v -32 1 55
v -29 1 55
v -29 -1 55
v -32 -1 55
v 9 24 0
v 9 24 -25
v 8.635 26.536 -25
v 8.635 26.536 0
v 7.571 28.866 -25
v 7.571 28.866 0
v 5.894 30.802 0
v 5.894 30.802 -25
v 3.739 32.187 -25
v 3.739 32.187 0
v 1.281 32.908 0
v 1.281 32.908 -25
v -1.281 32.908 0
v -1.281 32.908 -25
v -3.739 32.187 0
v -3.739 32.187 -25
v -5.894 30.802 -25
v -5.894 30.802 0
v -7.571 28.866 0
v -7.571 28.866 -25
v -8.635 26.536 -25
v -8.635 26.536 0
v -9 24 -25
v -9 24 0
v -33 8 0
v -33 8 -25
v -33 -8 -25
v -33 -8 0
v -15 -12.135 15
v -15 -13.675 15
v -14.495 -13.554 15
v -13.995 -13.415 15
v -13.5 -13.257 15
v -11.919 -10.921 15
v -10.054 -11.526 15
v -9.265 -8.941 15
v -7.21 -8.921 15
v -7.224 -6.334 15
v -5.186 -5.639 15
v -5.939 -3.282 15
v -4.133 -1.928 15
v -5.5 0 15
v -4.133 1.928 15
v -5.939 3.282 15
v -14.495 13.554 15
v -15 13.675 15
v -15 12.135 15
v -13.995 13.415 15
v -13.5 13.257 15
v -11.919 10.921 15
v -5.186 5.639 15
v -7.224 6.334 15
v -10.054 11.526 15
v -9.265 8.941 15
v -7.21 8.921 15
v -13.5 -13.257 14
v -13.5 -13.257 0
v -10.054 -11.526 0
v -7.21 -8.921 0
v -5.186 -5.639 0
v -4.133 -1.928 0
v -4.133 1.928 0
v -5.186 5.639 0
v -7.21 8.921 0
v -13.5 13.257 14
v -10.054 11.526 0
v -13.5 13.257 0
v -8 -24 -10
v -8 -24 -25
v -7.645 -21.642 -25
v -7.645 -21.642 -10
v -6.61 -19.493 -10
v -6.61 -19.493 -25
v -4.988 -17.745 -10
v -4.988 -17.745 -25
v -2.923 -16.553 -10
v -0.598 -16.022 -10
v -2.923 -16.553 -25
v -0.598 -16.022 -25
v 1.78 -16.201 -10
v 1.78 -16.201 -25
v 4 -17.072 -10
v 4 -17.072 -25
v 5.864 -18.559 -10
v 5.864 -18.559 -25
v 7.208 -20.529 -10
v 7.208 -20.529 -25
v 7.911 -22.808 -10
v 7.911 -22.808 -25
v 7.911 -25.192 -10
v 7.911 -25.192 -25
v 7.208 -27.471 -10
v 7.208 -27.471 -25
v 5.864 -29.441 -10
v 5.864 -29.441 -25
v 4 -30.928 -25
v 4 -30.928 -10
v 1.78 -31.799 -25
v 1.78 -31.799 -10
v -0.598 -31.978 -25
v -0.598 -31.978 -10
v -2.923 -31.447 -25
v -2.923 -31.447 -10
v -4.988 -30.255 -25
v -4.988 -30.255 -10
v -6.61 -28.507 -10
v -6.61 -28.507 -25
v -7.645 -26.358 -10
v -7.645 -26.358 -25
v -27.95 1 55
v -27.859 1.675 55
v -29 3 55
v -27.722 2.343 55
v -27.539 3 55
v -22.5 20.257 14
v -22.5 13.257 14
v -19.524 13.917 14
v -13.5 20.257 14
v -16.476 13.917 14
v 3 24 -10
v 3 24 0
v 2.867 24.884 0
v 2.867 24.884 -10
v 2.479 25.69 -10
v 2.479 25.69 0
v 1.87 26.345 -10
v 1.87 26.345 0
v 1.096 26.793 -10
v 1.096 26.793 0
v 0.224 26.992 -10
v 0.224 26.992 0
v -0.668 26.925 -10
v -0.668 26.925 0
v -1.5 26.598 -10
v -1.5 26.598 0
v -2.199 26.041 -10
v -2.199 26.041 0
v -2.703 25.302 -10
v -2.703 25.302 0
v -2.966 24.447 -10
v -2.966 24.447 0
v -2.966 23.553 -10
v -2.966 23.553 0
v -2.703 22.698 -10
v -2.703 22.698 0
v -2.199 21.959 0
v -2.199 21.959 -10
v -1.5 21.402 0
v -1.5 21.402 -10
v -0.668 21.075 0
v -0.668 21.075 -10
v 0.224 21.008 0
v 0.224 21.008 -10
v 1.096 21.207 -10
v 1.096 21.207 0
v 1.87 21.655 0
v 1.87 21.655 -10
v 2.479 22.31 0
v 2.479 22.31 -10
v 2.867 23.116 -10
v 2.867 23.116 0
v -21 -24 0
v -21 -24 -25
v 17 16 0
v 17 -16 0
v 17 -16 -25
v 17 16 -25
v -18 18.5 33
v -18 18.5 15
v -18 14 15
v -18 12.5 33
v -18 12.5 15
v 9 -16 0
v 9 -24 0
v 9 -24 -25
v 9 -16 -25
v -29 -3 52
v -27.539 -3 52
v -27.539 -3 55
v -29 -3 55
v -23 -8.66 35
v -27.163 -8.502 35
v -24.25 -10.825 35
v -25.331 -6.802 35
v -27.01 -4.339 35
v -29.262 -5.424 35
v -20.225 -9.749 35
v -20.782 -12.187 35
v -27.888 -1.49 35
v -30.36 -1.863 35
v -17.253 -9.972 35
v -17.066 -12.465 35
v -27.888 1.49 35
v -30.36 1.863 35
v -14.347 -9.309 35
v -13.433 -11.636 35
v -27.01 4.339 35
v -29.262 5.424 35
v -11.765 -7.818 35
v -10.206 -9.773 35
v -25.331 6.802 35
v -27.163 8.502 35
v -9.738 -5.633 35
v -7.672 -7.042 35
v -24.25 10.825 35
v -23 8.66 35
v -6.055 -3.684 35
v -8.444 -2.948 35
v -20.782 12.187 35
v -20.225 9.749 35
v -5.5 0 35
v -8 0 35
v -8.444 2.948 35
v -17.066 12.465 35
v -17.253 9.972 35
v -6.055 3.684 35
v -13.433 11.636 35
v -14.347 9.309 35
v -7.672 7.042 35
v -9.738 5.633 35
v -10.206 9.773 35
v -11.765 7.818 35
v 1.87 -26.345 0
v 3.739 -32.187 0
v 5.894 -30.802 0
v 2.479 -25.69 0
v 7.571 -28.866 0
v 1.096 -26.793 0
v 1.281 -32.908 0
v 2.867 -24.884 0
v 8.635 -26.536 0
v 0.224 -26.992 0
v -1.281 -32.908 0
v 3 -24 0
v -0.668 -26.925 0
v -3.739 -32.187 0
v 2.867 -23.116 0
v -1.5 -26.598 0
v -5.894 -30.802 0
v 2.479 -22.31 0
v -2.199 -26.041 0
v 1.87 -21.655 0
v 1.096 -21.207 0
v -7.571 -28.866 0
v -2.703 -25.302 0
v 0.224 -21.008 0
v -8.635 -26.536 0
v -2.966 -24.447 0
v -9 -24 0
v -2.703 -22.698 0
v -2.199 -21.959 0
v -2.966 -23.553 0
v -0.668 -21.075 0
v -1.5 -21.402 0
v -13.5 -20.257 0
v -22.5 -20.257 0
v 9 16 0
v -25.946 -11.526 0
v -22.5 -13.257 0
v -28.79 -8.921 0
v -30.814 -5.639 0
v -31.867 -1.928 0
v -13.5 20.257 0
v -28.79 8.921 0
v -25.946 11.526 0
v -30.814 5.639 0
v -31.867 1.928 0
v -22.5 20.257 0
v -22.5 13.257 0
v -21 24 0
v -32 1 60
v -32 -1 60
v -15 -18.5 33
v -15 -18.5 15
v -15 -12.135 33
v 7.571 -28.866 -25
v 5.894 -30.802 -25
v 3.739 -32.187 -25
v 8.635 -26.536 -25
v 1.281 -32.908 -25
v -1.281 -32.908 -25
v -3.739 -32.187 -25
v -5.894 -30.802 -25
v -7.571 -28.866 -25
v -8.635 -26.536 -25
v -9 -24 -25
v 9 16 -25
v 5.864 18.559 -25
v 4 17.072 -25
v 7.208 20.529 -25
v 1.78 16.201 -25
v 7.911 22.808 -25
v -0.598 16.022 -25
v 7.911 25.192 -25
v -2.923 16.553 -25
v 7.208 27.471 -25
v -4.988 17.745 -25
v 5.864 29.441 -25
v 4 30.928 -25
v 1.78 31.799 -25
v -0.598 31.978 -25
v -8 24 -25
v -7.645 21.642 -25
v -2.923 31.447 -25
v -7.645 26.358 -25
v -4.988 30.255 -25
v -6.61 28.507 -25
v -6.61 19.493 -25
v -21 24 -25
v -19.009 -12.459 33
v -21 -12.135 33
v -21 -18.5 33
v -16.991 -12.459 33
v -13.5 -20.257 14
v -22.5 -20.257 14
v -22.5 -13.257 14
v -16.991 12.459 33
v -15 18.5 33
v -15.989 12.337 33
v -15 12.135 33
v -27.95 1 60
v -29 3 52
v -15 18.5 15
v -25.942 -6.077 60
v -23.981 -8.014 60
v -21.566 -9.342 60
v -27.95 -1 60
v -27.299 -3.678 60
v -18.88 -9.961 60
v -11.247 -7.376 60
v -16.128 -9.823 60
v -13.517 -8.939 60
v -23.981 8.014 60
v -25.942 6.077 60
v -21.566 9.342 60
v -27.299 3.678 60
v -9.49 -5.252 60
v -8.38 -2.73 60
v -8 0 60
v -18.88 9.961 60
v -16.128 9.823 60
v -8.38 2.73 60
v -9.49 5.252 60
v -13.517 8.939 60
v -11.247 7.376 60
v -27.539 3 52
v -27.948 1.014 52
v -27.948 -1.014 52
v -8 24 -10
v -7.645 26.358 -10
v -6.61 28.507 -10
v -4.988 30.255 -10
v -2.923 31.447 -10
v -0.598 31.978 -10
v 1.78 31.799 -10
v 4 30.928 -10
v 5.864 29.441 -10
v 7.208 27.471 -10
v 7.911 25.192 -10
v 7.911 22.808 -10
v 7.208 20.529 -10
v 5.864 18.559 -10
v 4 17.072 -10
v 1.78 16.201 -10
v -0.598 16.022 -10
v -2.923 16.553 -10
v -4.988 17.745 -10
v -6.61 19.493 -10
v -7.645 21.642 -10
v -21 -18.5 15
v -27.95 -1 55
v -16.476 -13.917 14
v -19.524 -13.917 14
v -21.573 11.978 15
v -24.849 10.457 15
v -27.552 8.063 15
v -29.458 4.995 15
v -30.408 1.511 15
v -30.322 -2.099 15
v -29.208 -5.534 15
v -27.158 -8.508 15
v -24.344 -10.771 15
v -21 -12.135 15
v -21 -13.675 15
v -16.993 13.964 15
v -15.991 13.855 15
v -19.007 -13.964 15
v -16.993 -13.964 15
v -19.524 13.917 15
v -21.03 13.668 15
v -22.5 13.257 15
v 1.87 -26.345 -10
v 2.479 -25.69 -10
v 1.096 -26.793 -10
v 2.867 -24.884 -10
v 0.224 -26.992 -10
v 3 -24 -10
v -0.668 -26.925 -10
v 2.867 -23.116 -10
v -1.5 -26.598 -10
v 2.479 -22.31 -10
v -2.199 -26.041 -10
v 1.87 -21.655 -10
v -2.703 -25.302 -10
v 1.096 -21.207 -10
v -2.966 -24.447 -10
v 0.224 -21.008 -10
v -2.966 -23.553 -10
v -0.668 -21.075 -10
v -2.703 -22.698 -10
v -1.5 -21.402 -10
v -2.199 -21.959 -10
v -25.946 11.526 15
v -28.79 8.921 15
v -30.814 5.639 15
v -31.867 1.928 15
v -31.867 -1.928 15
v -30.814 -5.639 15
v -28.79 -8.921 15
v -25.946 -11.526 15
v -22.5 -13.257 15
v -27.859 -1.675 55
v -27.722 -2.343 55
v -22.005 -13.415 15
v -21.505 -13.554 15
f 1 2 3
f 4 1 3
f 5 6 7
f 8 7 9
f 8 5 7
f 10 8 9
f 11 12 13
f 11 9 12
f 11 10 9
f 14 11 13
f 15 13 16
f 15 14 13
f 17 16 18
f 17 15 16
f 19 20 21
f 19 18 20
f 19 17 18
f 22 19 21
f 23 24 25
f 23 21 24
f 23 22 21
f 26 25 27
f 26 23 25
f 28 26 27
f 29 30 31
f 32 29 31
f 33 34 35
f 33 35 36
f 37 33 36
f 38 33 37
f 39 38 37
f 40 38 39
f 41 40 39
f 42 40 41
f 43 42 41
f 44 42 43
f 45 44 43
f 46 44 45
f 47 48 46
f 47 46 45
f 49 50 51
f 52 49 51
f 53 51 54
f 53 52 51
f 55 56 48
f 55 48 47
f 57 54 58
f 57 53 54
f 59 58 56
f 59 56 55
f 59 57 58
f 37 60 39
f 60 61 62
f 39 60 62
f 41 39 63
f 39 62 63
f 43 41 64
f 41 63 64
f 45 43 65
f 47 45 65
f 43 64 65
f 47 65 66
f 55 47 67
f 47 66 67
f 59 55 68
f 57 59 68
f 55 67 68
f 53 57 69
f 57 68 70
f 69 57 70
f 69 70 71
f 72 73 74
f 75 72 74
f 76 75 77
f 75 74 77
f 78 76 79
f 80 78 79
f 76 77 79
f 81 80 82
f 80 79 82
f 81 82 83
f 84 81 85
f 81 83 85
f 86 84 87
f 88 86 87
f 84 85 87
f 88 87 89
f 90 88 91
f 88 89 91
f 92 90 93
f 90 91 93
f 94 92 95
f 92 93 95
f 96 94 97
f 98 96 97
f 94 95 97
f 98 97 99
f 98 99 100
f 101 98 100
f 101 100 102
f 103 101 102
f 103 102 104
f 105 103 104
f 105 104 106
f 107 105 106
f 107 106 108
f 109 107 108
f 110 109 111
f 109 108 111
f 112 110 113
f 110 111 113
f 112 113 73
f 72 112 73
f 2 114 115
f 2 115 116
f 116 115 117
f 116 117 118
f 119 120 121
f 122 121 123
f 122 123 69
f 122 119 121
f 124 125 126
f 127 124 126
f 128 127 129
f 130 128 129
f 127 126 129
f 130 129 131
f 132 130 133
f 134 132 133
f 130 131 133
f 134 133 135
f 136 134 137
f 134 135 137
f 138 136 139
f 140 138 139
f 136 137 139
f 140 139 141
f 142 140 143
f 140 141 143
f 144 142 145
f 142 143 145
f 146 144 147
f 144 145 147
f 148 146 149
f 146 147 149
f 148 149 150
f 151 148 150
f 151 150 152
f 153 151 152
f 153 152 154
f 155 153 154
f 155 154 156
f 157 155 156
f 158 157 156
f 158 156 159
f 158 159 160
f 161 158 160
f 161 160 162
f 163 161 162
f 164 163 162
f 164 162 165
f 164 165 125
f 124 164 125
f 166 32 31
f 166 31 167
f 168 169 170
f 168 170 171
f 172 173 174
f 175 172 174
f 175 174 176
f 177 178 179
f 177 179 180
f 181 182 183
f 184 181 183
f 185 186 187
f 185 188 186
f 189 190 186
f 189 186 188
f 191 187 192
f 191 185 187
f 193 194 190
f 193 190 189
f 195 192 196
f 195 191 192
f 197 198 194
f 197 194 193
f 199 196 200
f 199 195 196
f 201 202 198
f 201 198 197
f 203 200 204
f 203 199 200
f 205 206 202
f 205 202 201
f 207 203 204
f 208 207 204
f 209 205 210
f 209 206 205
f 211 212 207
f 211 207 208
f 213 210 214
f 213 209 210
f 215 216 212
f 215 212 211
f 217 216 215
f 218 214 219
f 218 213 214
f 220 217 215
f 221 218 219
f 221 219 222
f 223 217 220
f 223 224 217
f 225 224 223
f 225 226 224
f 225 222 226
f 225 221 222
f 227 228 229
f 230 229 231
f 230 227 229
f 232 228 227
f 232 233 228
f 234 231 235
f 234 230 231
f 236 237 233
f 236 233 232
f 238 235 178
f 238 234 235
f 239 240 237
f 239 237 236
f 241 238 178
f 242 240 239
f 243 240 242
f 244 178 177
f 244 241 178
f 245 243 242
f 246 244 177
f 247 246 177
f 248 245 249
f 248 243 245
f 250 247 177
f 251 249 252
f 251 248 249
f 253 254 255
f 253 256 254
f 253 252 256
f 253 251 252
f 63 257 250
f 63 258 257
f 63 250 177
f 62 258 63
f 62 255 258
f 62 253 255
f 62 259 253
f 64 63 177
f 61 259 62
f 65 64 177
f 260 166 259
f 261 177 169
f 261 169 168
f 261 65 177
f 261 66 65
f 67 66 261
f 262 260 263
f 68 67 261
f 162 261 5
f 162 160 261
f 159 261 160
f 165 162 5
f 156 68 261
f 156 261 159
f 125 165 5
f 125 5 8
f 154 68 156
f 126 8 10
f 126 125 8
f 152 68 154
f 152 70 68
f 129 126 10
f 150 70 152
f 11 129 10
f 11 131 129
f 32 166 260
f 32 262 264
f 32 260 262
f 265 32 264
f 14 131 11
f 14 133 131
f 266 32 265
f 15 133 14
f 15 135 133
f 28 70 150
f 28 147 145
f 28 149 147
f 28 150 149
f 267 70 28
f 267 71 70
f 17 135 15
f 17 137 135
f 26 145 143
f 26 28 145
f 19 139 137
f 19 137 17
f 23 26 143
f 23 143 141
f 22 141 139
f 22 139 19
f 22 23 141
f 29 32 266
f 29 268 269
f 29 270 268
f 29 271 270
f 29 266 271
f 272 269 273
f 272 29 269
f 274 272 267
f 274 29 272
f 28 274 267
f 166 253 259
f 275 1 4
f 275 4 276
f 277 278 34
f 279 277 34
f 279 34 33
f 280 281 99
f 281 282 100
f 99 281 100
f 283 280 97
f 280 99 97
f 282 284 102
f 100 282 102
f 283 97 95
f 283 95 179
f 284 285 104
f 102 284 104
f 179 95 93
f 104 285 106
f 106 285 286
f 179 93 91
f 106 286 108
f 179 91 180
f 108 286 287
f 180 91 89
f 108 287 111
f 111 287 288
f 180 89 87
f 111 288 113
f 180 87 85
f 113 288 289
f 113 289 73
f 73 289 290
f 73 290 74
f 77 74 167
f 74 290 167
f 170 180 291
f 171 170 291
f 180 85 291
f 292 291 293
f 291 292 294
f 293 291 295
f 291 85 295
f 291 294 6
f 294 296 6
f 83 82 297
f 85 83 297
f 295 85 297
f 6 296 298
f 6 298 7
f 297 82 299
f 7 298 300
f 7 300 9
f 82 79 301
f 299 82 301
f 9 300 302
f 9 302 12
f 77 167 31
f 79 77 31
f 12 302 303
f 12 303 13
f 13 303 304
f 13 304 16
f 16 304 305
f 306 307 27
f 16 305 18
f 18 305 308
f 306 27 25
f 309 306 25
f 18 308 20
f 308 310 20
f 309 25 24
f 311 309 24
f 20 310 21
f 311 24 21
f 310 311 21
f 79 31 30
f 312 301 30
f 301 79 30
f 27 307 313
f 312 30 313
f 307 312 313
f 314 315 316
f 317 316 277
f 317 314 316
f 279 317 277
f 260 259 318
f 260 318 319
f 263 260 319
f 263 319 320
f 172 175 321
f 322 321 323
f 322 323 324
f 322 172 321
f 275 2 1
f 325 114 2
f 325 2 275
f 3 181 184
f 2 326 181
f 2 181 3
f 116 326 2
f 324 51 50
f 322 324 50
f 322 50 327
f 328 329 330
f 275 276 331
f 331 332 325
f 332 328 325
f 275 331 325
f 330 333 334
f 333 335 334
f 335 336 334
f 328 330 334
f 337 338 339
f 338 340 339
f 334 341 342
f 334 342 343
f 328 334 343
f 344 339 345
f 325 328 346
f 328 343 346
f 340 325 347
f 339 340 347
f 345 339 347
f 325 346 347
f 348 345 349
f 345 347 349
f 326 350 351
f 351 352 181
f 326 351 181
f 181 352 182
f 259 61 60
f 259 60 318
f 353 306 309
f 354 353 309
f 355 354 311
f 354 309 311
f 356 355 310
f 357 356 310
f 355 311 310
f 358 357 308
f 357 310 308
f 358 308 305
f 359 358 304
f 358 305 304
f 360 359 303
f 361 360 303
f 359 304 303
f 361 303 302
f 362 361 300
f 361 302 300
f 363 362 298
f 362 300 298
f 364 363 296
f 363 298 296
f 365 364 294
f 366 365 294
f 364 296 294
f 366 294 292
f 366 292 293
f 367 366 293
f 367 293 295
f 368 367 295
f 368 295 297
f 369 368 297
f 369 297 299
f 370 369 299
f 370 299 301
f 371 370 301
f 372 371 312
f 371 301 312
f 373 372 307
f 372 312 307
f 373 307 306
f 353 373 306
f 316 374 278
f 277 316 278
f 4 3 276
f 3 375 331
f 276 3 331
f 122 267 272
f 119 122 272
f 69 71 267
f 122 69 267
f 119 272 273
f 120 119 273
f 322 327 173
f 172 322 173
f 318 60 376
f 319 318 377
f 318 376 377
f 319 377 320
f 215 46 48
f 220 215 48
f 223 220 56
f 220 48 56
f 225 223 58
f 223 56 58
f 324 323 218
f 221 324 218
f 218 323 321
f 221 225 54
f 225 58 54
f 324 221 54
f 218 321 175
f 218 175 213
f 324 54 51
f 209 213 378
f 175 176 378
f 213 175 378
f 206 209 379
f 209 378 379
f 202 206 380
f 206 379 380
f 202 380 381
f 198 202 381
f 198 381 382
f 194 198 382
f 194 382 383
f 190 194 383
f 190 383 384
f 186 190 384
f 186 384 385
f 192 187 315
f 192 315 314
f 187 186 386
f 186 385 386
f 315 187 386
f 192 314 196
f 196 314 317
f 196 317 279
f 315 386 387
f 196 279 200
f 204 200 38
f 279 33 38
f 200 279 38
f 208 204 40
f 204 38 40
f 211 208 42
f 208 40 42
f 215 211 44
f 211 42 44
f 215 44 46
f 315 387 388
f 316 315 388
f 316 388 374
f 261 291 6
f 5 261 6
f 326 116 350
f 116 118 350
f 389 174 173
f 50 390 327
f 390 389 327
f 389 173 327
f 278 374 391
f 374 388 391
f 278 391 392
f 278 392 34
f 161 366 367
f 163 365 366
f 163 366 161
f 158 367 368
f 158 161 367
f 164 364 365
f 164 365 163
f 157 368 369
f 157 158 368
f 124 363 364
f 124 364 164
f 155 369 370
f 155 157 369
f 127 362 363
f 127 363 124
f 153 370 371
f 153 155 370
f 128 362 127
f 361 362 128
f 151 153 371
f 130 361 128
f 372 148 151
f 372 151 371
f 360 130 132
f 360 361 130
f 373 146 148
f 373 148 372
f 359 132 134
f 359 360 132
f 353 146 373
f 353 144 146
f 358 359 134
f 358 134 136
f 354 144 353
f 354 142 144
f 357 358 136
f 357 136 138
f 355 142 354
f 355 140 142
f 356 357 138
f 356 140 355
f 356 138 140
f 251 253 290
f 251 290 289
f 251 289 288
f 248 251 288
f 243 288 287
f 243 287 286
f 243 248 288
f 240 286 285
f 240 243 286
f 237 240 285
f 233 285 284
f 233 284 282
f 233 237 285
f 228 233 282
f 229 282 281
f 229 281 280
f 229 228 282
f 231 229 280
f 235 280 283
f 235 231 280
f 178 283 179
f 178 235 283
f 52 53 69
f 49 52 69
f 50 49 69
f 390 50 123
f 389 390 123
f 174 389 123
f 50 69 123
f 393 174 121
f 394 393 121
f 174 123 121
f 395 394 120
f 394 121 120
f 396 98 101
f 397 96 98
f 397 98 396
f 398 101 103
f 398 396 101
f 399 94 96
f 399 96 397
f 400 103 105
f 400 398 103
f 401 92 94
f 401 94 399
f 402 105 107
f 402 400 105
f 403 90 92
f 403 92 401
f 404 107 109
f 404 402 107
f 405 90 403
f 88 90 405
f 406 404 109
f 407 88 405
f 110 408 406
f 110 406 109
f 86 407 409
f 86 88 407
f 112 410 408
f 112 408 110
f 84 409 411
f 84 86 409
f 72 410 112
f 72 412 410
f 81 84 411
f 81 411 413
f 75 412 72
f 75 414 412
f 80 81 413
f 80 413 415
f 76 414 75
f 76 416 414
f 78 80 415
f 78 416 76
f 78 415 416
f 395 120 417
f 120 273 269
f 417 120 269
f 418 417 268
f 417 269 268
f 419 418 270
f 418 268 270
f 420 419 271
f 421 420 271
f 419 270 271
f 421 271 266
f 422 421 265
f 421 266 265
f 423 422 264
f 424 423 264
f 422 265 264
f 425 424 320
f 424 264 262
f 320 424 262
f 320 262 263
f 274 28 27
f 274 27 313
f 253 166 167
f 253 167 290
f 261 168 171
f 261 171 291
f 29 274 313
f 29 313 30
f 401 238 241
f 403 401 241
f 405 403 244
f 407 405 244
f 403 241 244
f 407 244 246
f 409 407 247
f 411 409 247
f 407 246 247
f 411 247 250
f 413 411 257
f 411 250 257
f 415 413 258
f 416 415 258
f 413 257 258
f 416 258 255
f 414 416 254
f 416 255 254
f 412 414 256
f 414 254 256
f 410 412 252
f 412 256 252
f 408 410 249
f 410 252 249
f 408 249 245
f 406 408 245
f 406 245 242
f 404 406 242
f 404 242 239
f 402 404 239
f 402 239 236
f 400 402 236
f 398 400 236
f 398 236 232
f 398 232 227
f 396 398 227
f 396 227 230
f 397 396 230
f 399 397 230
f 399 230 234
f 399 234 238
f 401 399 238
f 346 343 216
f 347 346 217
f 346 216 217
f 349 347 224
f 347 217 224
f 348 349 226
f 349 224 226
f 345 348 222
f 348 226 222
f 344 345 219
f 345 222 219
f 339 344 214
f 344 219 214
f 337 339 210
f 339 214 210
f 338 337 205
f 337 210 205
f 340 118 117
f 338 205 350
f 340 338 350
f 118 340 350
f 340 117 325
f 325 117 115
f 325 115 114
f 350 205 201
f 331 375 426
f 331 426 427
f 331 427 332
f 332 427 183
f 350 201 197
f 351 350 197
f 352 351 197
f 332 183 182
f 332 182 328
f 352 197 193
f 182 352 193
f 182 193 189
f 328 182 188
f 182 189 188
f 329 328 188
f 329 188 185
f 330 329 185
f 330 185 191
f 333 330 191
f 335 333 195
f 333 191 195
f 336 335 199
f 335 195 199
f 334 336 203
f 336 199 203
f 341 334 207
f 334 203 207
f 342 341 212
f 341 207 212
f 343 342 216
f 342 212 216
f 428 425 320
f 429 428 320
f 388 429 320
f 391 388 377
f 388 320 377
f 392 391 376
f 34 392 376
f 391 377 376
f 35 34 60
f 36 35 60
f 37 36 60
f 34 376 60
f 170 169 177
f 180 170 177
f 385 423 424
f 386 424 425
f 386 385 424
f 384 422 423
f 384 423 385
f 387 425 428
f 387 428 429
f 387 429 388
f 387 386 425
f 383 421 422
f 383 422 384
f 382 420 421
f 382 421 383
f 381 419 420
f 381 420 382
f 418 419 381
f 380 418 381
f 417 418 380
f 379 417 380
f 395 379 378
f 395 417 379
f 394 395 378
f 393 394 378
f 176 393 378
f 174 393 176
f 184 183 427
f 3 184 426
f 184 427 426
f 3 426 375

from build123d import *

# Parameters (mm, degrees)
SKETCH1_R                = 9
SKETCH1_R_2              = 3
SKETCH1_W                = 32
SKETCH1_H                = 8
BOSS_EXTRUDE1_DEPTH      = 25
BOSS_EXTRUDE2_DEPTH      = 15
BOSS_EXTRUDE3_DEPTH      = 14
SKETCH3_R                = 12.5
BOSS_EXTRUDE4_DEPTH      = 20
BOSS_EXTRUDE5_DEPTH      = 18
SKETCH5_R                = 10
BOSS_EXTRUDE6_DEPTH      = 25
BOSS_EXTRUDE7_REACH      = 103.681
BOSS_EXTRUDE7_END_RADIUS = 10
SKETCH7_W                = 5
SKETCH7_H                = 1
BOSS_EXTRUDE8_DEPTH      = 1
SKETCH7_4_W              = 5
SKETCH7_4_H              = 1
BOSS_EXTRUDE9_DEPTH      = 4
SKETCH10_R               = 8
CUT_EXTRUDE1_DEPTH       = 15


with BuildPart() as part:
    # Sketch1 → Boss-Extrude1 (new body)
    # profile 1 of 4: a face of its own
    with BuildSketch(Plane(origin=(0, 0, 0), x_dir=(0, 1, 0), z_dir=(0, 0, 1))):
        with Locations((-24, 0)):
            Circle(SKETCH1_R)
        with Locations(Location((-24, 0, 0), (0, 0, 270))):
            Circle(SKETCH1_R_2, mode=Mode.SUBTRACT)
    # profile 2 of 4: a face of its own
    with BuildSketch(Plane(origin=(0, 0, 0), x_dir=(0, 1, 0), z_dir=(0, 0, 1))):
        with BuildLine():
            ThreePointArc((-15, 0), (-17.636038969, -6.363961031), (-24, -9))
            Line((-24, -9), (-16, -9))
            Line((-16, -9), (16, -9))
            Line((16, -9), (24, -9))
            ThreePointArc((24, -9), (15, 0), (24, 9))
            Line((24, 9), (24, 21))
            Line((24, 21), (8, 33))
            Line((8, 33), (-8, 33))
            Line((-8, 33), (-24, 21))
            Line((-24, 21), (-24, 9))
            ThreePointArc((-24, 9), (-17.636038969, 6.363961031), (-15, 0))
        make_face()
    # profile 3 of 4: a face of its own
    with BuildSketch(Plane(origin=(0, 0, 0), x_dir=(0, 1, 0), z_dir=(0, 0, 1))):
        with Locations((24, 0)):
            Circle(SKETCH1_R)
        with Locations(Location((24, 0, 0), (0, 0, 270))):
            Circle(SKETCH1_R_2, mode=Mode.SUBTRACT)
    # profile 4 of 4: a face of its own
    with BuildSketch(Plane(origin=(0, 0, 0), x_dir=(0, 1, 0), z_dir=(0, 0, 1))):
        with Locations((0, -13)):
            Rectangle(SKETCH1_W, SKETCH1_H)
    extrude(amount=-BOSS_EXTRUDE1_DEPTH)

    # Sketch2 → Boss-Extrude2 (add)
    with BuildSketch(Plane.XY):
        with BuildLine():
            ThreePointArc((-22.5, -13.257073584), (-18, -14), (-13.5, -13.257073584))
            ThreePointArc((-13.5, -13.257073584), (-4, 0), (-13.5, 13.257073584))
            ThreePointArc((-13.5, 13.257073584), (-18, 14), (-22.5, 13.257073584))
            ThreePointArc((-22.5, 13.257073584), (-32, 0), (-22.5, -13.257073584))
        make_face()
    extrude(amount=BOSS_EXTRUDE2_DEPTH)

    # Sketch2<3> → Boss-Extrude3 (add)
    with BuildSketch(Plane.XY):
        with BuildLine():
            ThreePointArc((-22.5, -13.257073584), (-18, -14), (-13.5, -13.257073584))
            Line((-13.5, -13.257073584), (-13.5, -20.257073584))
            Line((-13.5, -20.257073584), (-22.5, -20.257073584))
            Line((-22.5, -20.257073584), (-22.5, -13.257073584))
        make_face()
        with BuildLine():
            Line((-22.5, 20.257073584), (-22.5, 13.257073584))
            ThreePointArc((-22.5, 13.257073584), (-18, 14), (-13.5, 13.257073584))
            Line((-13.5, 13.257073584), (-13.5, 20.257073584))
            Line((-13.5, 20.257073584), (-22.5, 20.257073584))
        make_face()
    extrude(amount=BOSS_EXTRUDE3_DEPTH)

    # Sketch3 → Boss-Extrude4 (add)
    with BuildSketch(Plane.XY.offset(15)):
        with Locations((-18, 0)):
            Circle(SKETCH3_R)
    extrude(amount=BOSS_EXTRUDE4_DEPTH)

    # Sketch3<3> → Boss-Extrude5 (add)
    with BuildSketch(Plane.XY.offset(15)):
        with BuildLine():
            Line((-18, 18.5), (-18, 12.5))
            ThreePointArc((-18, 12.5), (-16.488918226, 12.408329133), (-15, 12.1346611))
            Line((-15, 12.1346611), (-15, 18.5))
            Line((-15, 18.5), (-18, 18.5))
        make_face()
        with BuildLine():
            Line((-15, -18.5), (-15, -12.1346611))
            ThreePointArc((-15, -12.1346611), (-18, -12.5), (-21, -12.1346611))
            Line((-21, -12.1346611), (-21, -18.5))
            Line((-21, -18.5), (-15, -18.5))
        make_face()
    extrude(amount=BOSS_EXTRUDE5_DEPTH)

    # Sketch5 → Boss-Extrude6 (add)
    with BuildSketch(Plane.XY.offset(35)):
        with Locations((-18, 0)):
            Circle(SKETCH5_R)
    extrude(amount=BOSS_EXTRUDE6_DEPTH)

    # Boss-Extrude7: up to this cylinder (the profile starts outside it)
    boss_extrude7_end = Plane(origin=(-18, 0, 55.5), z_dir=(0, 0, -1)) * Cylinder(BOSS_EXTRUDE7_END_RADIUS, 232.362, mode=Mode.PRIVATE)
    # Sketch7 → Boss-Extrude7 (add, up to the surface)
    with BuildSketch(Plane(origin=(-28, 0, 60), x_dir=(0, 0, 1), z_dir=(-1, 0, 0)), mode=Mode.PRIVATE) as boss_extrude7_sk1:
        Polygon((-5, -1), (-5, 0), (-5, 1), (-5, 3), (-8, 3), (-8, -3), (-5, -3), align=None)
    boss_extrude7_tool1 = extrude(boss_extrude7_sk1.sketch, amount=-BOSS_EXTRUDE7_REACH, mode=Mode.PRIVATE) - boss_extrude7_end
    add(boss_extrude7_tool1.solids().sort_by_distance((-28, 0, 53.5))[0])
    add(boss_extrude7_tool1.solids().sort_by_distance((-28, 0, 53.5))[1])
    # Sketch7 → Boss-Extrude7 (add, up to the surface)
    with BuildSketch(Plane(origin=(-28, 0, 60), x_dir=(0, 0, 1), z_dir=(-1, 0, 0)), mode=Mode.PRIVATE) as boss_extrude7_sk2:
        with Locations((-2.5, 0.5)):
            Rectangle(SKETCH7_W, SKETCH7_H)
    boss_extrude7_tool2 = extrude(boss_extrude7_sk2.sketch, amount=-BOSS_EXTRUDE7_REACH, mode=Mode.PRIVATE) - boss_extrude7_end
    add(boss_extrude7_tool2.solids().sort_by_distance((-28, 0.5, 57.5))[0])
    # Sketch7 → Boss-Extrude7 (add, up to the surface)
    with BuildSketch(Plane(origin=(-28, 0, 60), x_dir=(0, 0, 1), z_dir=(-1, 0, 0)), mode=Mode.PRIVATE) as boss_extrude7_sk3:
        with Locations((-2.5, -0.5)):
            Rectangle(SKETCH7_W, SKETCH7_H)
    boss_extrude7_tool3 = extrude(boss_extrude7_sk3.sketch, amount=-BOSS_EXTRUDE7_REACH, mode=Mode.PRIVATE) - boss_extrude7_end
    add(boss_extrude7_tool3.solids().sort_by_distance((-28, -0.5, 57.5))[0])

    # Sketch7<2> → Boss-Extrude8 (add)
    with BuildSketch(Plane(origin=(-28, 0, 60), x_dir=(0, 0, 1), z_dir=(-1, 0, 0))):
        Polygon((-8, -3), (-5, -3), (-5, -1), (-5, 1), (-5, 3), (-8, 3), align=None)
    extrude(amount=BOSS_EXTRUDE8_DEPTH)

    # Sketch7<4> → Boss-Extrude9 (add)
    with BuildSketch(Plane(origin=(-28, 0, 60), x_dir=(0, 0, 1), z_dir=(-1, 0, 0))):
        with Locations((-2.5, 0.5)):
            Rectangle(SKETCH7_4_W, SKETCH7_4_H)
        with Locations((-2.5, -0.5)):
            Rectangle(SKETCH7_4_W, SKETCH7_4_H)
    extrude(amount=BOSS_EXTRUDE9_DEPTH)

    # Sketch10 → Cut-Extrude1 (cut)
    with BuildSketch(Plane(origin=(0, 0, -25), x_dir=(1, 0, 0), z_dir=(0, 0, -1))):
        with Locations(Location((0, 24, 0), (0, 0, 180))):
            Circle(SKETCH10_R)
        with Locations(Location((0, -24, 0), (0, 0, 180))):
            Circle(SKETCH10_R)
    extrude(amount=-CUT_EXTRUDE1_DEPTH, mode=Mode.SUBTRACT)


solid = part.part
